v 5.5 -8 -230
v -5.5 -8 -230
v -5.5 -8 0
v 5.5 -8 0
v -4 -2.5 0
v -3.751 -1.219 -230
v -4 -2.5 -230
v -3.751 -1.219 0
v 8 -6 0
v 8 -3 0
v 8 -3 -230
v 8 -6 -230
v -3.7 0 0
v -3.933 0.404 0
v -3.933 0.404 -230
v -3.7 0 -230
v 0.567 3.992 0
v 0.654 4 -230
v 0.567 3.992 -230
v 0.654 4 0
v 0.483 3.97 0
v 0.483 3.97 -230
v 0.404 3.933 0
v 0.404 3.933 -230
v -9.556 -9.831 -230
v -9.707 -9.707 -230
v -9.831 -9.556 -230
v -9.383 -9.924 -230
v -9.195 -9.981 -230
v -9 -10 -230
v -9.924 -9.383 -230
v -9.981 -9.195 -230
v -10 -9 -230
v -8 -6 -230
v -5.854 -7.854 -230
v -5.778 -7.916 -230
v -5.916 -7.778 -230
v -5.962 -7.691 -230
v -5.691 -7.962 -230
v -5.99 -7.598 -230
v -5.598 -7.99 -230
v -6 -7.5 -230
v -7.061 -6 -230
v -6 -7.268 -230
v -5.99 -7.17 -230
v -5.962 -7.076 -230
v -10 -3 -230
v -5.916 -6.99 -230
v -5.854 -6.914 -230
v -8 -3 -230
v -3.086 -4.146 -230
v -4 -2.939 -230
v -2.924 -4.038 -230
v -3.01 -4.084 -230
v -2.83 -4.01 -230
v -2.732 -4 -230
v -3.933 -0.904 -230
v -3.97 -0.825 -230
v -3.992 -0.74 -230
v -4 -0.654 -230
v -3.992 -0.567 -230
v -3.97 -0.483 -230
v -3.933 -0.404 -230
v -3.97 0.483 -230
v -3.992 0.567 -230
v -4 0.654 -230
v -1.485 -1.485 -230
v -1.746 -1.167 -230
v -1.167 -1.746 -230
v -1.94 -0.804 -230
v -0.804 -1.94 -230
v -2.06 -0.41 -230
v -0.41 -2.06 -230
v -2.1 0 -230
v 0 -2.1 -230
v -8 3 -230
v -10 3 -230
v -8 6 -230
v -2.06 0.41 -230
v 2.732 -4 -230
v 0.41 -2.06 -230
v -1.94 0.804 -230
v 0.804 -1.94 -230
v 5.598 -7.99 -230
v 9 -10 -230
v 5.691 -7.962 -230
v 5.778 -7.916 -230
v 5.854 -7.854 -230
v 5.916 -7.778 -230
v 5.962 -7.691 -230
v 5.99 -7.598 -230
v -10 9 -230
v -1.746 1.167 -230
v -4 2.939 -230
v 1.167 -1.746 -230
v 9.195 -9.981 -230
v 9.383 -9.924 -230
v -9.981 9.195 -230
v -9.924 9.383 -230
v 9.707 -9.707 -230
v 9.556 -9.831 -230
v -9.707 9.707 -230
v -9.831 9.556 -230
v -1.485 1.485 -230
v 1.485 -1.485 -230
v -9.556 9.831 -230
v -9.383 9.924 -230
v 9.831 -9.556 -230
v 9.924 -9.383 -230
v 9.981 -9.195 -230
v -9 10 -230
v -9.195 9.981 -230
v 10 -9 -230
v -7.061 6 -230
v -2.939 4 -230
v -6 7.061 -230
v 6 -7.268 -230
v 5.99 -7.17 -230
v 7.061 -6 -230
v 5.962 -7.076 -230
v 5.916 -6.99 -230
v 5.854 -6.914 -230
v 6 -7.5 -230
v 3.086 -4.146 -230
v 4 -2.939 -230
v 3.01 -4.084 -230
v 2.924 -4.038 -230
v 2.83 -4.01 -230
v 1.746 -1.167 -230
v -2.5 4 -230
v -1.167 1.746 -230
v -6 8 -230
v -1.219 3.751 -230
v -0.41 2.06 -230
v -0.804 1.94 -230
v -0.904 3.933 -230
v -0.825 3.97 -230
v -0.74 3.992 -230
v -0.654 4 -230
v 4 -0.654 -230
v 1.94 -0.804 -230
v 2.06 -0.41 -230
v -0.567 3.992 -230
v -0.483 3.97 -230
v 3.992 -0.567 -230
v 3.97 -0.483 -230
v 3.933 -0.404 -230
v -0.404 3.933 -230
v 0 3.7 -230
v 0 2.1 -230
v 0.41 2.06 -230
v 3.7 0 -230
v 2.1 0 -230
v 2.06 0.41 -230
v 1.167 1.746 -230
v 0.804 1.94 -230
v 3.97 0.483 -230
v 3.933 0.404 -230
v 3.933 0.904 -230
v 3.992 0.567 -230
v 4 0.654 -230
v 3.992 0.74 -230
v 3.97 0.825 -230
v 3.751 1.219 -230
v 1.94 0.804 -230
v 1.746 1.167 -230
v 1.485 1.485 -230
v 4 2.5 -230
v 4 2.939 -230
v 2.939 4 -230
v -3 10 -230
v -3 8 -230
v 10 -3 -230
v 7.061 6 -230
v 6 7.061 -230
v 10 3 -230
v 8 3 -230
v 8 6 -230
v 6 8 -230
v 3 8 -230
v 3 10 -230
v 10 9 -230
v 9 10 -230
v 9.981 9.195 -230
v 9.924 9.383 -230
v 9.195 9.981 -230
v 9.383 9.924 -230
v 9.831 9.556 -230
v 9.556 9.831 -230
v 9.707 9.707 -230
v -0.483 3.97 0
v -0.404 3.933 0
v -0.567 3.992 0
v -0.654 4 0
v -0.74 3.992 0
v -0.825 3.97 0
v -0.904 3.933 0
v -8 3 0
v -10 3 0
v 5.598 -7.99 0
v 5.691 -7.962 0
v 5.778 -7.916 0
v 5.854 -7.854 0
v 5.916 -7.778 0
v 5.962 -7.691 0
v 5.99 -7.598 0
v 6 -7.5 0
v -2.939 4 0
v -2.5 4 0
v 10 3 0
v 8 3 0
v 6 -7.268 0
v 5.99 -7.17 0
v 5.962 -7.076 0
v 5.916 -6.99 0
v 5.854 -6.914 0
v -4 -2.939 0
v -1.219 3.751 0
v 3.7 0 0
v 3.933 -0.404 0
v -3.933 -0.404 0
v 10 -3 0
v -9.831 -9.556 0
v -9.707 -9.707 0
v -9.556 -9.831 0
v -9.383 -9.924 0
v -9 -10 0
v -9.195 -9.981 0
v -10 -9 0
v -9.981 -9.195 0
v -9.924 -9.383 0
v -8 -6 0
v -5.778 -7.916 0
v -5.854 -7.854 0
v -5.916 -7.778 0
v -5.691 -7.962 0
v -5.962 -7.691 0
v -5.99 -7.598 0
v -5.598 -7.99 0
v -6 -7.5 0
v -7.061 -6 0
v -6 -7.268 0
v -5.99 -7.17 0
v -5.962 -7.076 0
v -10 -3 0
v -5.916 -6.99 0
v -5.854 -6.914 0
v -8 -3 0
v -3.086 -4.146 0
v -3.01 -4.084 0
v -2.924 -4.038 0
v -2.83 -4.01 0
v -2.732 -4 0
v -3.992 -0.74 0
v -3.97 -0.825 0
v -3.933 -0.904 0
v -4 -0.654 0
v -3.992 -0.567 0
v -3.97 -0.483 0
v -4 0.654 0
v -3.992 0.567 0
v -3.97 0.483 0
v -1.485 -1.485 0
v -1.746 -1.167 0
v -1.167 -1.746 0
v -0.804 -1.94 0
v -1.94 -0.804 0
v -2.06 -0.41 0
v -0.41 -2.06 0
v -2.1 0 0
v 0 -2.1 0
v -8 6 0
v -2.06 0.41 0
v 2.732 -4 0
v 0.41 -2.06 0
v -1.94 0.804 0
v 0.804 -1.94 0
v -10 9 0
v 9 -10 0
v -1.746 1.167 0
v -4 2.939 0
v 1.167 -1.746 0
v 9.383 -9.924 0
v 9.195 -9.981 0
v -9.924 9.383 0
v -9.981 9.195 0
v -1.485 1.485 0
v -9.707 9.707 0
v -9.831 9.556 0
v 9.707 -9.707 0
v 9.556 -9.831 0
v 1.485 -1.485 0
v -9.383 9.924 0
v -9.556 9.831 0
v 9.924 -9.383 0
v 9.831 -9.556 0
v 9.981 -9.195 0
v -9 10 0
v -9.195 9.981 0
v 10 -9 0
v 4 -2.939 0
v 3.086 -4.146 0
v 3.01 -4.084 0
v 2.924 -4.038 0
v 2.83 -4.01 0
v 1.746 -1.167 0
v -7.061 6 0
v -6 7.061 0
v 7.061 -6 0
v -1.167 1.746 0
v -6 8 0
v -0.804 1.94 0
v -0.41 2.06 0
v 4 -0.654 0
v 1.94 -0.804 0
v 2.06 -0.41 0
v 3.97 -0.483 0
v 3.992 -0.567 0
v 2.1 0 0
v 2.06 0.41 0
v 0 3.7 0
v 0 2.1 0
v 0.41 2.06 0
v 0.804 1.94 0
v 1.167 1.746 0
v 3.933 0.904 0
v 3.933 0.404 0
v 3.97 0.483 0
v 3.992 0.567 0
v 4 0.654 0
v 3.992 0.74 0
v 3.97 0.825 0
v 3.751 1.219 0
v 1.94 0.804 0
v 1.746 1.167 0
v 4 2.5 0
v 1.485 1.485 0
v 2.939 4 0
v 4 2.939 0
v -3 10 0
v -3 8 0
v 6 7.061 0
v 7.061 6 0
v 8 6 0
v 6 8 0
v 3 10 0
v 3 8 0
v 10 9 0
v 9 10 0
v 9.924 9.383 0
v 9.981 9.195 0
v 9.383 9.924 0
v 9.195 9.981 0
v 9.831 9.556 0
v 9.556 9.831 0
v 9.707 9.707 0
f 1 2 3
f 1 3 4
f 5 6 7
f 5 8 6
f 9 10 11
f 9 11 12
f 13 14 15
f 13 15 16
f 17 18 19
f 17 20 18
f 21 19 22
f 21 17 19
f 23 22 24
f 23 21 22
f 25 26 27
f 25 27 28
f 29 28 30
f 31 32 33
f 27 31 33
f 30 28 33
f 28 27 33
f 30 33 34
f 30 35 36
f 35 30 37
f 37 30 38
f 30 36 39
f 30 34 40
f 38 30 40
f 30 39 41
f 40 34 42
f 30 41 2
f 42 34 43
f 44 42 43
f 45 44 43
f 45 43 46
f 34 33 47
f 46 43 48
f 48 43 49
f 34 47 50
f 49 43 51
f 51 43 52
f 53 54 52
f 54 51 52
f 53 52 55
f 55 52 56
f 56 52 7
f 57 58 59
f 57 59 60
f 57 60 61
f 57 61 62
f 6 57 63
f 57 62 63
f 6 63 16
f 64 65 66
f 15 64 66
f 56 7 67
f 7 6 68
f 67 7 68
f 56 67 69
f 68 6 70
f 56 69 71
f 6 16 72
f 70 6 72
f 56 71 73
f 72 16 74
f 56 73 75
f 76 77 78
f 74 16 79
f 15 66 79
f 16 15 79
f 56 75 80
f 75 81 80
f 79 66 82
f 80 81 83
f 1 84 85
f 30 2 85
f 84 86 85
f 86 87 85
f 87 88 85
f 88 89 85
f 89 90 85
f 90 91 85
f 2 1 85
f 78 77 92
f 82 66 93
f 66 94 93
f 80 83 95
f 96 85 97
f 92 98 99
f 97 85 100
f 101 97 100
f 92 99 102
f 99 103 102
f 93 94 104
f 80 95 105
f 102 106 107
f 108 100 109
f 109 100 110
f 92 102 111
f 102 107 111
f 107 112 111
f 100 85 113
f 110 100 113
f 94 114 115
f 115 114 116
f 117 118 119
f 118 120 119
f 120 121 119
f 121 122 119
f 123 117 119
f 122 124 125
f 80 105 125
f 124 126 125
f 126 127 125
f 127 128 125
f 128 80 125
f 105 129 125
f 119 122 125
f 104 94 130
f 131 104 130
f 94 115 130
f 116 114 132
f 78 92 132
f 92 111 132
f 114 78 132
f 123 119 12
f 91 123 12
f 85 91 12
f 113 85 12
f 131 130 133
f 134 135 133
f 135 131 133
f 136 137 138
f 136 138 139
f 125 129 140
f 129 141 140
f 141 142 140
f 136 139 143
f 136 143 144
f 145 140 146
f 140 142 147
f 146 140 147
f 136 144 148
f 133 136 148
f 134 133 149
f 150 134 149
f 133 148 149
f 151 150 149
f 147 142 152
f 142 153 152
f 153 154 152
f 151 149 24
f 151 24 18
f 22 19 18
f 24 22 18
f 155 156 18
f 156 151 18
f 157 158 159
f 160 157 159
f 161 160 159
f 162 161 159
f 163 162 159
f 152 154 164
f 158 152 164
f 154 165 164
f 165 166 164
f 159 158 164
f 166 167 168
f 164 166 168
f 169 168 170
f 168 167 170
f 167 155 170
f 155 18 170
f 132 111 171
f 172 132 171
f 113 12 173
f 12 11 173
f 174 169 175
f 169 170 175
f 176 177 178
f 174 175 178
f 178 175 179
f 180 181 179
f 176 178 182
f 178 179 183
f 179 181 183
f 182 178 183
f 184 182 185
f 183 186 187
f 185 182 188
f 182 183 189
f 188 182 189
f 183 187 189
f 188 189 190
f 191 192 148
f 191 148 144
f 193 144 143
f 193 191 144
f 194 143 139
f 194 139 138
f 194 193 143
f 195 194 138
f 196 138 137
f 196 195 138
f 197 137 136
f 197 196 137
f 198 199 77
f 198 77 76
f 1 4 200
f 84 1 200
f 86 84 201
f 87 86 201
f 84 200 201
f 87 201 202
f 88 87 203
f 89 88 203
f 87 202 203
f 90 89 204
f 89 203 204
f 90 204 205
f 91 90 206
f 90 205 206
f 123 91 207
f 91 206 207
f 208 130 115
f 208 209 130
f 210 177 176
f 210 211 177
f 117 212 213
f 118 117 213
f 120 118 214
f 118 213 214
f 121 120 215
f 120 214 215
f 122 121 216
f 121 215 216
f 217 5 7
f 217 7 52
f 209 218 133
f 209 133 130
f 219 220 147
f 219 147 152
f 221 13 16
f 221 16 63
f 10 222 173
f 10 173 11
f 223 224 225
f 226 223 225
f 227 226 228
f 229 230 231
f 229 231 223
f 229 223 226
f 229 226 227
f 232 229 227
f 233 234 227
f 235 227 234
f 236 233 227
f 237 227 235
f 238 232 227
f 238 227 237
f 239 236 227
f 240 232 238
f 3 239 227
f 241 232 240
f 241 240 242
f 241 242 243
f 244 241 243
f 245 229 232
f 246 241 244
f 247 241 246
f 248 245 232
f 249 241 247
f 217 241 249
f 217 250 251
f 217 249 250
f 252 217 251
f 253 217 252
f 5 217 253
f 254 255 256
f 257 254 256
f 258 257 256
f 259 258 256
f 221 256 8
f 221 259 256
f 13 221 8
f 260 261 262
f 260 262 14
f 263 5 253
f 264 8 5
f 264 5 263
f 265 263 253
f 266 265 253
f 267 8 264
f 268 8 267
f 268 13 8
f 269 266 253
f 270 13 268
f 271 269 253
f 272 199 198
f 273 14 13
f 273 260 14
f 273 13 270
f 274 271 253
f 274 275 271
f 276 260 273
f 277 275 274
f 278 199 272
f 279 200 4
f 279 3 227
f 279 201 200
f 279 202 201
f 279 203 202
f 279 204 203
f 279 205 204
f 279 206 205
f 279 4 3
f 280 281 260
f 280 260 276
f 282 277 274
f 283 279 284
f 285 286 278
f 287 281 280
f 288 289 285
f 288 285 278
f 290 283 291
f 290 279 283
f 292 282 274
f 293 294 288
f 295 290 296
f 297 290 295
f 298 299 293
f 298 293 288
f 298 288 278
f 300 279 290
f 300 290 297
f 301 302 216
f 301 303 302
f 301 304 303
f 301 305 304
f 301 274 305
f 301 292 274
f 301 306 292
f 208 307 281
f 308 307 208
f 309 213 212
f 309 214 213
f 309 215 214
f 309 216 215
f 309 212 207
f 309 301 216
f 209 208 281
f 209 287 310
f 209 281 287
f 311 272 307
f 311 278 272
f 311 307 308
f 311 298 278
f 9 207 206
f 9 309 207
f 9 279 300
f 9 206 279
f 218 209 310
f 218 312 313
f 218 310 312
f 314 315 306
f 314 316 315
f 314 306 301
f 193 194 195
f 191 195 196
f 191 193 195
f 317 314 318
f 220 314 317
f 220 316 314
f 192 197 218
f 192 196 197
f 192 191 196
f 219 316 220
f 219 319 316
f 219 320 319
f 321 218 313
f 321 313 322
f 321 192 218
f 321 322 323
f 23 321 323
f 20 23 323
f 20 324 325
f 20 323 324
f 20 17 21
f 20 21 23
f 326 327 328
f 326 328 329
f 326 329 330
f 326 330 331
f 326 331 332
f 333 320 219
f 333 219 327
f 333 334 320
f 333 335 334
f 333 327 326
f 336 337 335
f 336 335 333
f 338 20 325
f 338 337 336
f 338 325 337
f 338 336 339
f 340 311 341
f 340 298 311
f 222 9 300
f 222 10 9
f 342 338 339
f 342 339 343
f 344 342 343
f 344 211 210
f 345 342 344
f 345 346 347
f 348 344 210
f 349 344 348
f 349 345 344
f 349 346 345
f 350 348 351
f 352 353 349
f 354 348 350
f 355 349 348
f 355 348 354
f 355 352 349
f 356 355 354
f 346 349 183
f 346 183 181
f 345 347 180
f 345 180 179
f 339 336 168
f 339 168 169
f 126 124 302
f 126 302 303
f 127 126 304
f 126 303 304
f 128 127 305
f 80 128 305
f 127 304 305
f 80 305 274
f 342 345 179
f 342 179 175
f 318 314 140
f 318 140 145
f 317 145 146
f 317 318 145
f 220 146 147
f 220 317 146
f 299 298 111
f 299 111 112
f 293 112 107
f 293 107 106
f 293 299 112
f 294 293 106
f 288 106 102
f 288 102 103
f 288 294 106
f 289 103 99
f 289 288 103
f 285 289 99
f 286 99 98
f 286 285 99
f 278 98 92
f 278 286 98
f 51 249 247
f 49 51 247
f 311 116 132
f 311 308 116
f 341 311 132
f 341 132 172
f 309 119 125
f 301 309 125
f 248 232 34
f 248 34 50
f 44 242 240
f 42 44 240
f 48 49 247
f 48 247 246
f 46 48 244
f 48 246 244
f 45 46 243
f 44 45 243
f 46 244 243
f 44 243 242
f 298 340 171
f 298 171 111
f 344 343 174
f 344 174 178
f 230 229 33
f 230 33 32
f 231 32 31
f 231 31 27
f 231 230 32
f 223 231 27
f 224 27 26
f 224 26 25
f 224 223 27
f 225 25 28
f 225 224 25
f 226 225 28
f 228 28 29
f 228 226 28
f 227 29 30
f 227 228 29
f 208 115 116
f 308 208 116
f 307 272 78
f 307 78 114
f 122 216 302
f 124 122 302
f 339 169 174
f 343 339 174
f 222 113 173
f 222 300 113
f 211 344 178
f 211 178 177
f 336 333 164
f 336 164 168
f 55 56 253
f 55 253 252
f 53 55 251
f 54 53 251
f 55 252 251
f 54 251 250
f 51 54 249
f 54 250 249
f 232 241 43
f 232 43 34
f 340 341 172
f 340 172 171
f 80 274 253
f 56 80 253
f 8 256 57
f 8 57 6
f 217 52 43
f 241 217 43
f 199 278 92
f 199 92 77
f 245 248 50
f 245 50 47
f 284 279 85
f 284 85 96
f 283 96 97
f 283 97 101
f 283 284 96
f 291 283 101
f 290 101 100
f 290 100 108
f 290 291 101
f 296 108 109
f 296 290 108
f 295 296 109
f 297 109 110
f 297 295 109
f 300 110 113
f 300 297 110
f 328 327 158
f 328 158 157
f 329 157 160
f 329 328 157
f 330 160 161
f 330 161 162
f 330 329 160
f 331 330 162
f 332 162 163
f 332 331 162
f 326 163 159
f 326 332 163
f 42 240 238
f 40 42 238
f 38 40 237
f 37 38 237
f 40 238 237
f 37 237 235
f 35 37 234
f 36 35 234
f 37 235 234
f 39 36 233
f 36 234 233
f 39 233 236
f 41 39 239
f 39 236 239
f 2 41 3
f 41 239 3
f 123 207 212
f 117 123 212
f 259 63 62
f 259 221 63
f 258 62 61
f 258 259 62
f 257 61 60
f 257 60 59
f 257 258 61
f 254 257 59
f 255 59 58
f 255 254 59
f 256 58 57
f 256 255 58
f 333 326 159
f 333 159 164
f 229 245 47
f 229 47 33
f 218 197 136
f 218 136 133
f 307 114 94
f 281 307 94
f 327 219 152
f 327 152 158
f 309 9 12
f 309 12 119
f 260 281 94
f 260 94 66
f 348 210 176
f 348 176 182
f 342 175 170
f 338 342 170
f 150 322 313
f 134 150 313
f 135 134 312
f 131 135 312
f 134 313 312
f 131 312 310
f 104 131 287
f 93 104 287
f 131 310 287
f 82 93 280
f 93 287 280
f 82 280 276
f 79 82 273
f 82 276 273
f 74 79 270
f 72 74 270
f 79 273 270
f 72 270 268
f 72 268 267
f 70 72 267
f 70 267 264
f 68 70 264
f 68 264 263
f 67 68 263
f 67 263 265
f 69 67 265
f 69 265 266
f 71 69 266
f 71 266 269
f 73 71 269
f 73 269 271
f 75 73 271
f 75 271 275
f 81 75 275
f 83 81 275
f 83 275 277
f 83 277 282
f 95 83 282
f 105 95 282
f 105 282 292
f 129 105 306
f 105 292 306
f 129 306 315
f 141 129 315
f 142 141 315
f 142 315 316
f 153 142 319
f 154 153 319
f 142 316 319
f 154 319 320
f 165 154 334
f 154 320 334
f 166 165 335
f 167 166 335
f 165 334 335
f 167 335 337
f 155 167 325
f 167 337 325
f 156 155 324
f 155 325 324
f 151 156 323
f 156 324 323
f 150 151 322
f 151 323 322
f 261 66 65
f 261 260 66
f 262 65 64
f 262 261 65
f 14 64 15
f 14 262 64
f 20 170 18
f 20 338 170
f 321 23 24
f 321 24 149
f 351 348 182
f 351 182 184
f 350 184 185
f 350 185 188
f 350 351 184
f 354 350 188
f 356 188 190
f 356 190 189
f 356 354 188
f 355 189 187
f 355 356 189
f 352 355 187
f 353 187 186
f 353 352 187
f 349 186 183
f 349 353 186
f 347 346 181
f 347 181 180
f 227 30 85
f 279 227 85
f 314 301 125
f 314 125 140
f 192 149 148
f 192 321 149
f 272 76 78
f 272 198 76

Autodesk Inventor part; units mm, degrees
sketch "Sketch_76" plane through (0, 0, 0) normal (0, 0, 1) x (1, 0, 0)
  line L0 (-10, -3) -> (-10, -9)
  arc A0 (-10, -9) -> (-9, -10) centre (-9, -9) ccw
  line L1 (-9, -10) -> (9, -10)
  arc A1 (9, -10) -> (10, -9) centre (9, -9) ccw
  line L2 (10, -9) -> (10, -3)
  line L3 (10, -3) -> (8, -3)
  line L4 (8, -3) -> (8, -6)
  line L5 (8, -6) -> (7.0607, -6)
  line L6 (7.0607, -6) -> (4, -2.9393)
  line L7 (4, -2.9393) -> (4, -0.6536)
  arc A2 (4, -0.6536) -> (3.933, -0.4036) centre (3.5, -0.6536) ccw
  line L8 (3.933, -0.4036) -> (3.7, 0)
  line L9 (3.7, 0) -> (3.933, 0.4036)
  arc A3 (3.933, 0.4036) -> (3.933, 0.9036) centre (3.5, 0.6536) ccw
  line L10 (3.933, 0.9036) -> (3.751, 1.2189)
  line L11 (3.751, 1.2189) -> (4, 2.5)
  line L12 (4, 2.5) -> (4, 2.9393)
  line L13 (4, 2.9393) -> (7.0607, 6)
  line L14 (7.0607, 6) -> (8, 6)
  line L15 (8, 6) -> (8, 3)
  line L16 (8, 3) -> (10, 3)
  line L17 (10, 3) -> (10, 9)
  arc A4 (10, 9) -> (9, 10) centre (9, 9) ccw
  line L18 (9, 10) -> (3, 10)
  line L19 (3, 10) -> (3, 8)
  line L20 (3, 8) -> (6, 8)
  line L21 (6, 8) -> (6, 7.0607)
  line L22 (6, 7.0607) -> (2.9393, 4)
  line L23 (2.9393, 4) -> (0.6536, 4)
  arc A5 (0.6536, 4) -> (0.4036, 3.933) centre (0.6536, 3.5) ccw
  line L24 (0.4036, 3.933) -> (0, 3.7)
  line L25 (0, 3.7) -> (-0.4036, 3.933)
  arc A6 (-0.4036, 3.933) -> (-0.9036, 3.933) centre (-0.6536, 3.5) ccw
  line L26 (-0.9036, 3.933) -> (-1.2189, 3.751)
  line L27 (-1.2189, 3.751) -> (-2.5, 4)
  line L28 (-2.5, 4) -> (-2.9393, 4)
  line L29 (-2.9393, 4) -> (-6, 7.0607)
  line L30 (-6, 7.0607) -> (-6, 8)
  line L31 (-6, 8) -> (-3, 8)
  line L32 (-3, 8) -> (-3, 10)
  line L33 (-3, 10) -> (-9, 10)
  arc A7 (-9, 10) -> (-10, 9) centre (-9, 9) ccw
  line L34 (-10, 9) -> (-10, 3)
  line L35 (-10, 3) -> (-8, 3)
  line L36 (-8, 3) -> (-8, 6)
  line L37 (-8, 6) -> (-7.0607, 6)
  line L38 (-7.0607, 6) -> (-4, 2.9393)
  line L39 (-4, 2.9393) -> (-4, 0.6536)
  arc A8 (-4, 0.6536) -> (-3.933, 0.4036) centre (-3.5, 0.6536) ccw
  line L40 (-3.933, 0.4036) -> (-3.7, 0)
  line L41 (-3.7, 0) -> (-3.933, -0.4036)
  arc A9 (-3.933, -0.4036) -> (-3.933, -0.9036) centre (-3.5, -0.6536) ccw
  line L42 (-3.933, -0.9036) -> (-3.751, -1.2189)
  line L43 (-3.751, -1.2189) -> (-4, -2.5)
  line L44 (-4, -2.5) -> (-4, -2.9393)
  line L45 (-4, -2.9393) -> (-7.0607, -6)
  line L46 (-7.0607, -6) -> (-8, -6)
  line L47 (-8, -6) -> (-8, -3)
  line L48 (-8, -3) -> (-10, -3)
  line L49 (-6, -7.2678) -> (-6, -7.5)
  arc A10 (-6, -7.5) -> (-5.5, -8) centre (-5.5, -7.5) ccw
  line L50 (-5.5, -8) -> (5.5, -8)
  arc A11 (5.5, -8) -> (6, -7.5) centre (5.5, -7.5) ccw
  line L51 (6, -7.5) -> (6, -7.2678)
  arc A12 (6, -7.2678) -> (5.8536, -6.9142) centre (5.5, -7.2678) ccw
  line L52 (5.8536, -6.9142) -> (3.0858, -4.1464)
  arc A13 (3.0858, -4.1464) -> (2.7322, -4) centre (2.7322, -4.5) ccw
  line L53 (2.7322, -4) -> (-2.7322, -4)
  arc A14 (-2.7322, -4) -> (-3.0858, -4.1464) centre (-2.7322, -4.5) ccw
  line L54 (-3.0858, -4.1464) -> (-5.8536, -6.9142)
  arc A15 (-5.8536, -6.9142) -> (-6, -7.2678) centre (-5.5, -7.2678) ccw
extrude "Extrusion1" add sketch "Sketch_76" against normal blind 230
sketch "Sketch2" plane through (0, 0, -230) normal (0, 0, -1) x (-1, 0, 0)
  point P0 (0, 0)
hole "Hole1" at (0, 0, -230) direction (0, 0, 1) diameter 4.2 depth 230
ref_plane "C1_XY" through (0, 0, 0) normal (0, 0, 1) x (1, 0, 0)
ref_plane "C1_YZ" through (0, 0, 0) normal (1, 0, 0) x (0, 1, 0)
ref_plane "C1_ZX" through (0, 0, 0) normal (0, 1, 0) x (0, 0, 1)
properties part number "NFSF5-2020-230"
